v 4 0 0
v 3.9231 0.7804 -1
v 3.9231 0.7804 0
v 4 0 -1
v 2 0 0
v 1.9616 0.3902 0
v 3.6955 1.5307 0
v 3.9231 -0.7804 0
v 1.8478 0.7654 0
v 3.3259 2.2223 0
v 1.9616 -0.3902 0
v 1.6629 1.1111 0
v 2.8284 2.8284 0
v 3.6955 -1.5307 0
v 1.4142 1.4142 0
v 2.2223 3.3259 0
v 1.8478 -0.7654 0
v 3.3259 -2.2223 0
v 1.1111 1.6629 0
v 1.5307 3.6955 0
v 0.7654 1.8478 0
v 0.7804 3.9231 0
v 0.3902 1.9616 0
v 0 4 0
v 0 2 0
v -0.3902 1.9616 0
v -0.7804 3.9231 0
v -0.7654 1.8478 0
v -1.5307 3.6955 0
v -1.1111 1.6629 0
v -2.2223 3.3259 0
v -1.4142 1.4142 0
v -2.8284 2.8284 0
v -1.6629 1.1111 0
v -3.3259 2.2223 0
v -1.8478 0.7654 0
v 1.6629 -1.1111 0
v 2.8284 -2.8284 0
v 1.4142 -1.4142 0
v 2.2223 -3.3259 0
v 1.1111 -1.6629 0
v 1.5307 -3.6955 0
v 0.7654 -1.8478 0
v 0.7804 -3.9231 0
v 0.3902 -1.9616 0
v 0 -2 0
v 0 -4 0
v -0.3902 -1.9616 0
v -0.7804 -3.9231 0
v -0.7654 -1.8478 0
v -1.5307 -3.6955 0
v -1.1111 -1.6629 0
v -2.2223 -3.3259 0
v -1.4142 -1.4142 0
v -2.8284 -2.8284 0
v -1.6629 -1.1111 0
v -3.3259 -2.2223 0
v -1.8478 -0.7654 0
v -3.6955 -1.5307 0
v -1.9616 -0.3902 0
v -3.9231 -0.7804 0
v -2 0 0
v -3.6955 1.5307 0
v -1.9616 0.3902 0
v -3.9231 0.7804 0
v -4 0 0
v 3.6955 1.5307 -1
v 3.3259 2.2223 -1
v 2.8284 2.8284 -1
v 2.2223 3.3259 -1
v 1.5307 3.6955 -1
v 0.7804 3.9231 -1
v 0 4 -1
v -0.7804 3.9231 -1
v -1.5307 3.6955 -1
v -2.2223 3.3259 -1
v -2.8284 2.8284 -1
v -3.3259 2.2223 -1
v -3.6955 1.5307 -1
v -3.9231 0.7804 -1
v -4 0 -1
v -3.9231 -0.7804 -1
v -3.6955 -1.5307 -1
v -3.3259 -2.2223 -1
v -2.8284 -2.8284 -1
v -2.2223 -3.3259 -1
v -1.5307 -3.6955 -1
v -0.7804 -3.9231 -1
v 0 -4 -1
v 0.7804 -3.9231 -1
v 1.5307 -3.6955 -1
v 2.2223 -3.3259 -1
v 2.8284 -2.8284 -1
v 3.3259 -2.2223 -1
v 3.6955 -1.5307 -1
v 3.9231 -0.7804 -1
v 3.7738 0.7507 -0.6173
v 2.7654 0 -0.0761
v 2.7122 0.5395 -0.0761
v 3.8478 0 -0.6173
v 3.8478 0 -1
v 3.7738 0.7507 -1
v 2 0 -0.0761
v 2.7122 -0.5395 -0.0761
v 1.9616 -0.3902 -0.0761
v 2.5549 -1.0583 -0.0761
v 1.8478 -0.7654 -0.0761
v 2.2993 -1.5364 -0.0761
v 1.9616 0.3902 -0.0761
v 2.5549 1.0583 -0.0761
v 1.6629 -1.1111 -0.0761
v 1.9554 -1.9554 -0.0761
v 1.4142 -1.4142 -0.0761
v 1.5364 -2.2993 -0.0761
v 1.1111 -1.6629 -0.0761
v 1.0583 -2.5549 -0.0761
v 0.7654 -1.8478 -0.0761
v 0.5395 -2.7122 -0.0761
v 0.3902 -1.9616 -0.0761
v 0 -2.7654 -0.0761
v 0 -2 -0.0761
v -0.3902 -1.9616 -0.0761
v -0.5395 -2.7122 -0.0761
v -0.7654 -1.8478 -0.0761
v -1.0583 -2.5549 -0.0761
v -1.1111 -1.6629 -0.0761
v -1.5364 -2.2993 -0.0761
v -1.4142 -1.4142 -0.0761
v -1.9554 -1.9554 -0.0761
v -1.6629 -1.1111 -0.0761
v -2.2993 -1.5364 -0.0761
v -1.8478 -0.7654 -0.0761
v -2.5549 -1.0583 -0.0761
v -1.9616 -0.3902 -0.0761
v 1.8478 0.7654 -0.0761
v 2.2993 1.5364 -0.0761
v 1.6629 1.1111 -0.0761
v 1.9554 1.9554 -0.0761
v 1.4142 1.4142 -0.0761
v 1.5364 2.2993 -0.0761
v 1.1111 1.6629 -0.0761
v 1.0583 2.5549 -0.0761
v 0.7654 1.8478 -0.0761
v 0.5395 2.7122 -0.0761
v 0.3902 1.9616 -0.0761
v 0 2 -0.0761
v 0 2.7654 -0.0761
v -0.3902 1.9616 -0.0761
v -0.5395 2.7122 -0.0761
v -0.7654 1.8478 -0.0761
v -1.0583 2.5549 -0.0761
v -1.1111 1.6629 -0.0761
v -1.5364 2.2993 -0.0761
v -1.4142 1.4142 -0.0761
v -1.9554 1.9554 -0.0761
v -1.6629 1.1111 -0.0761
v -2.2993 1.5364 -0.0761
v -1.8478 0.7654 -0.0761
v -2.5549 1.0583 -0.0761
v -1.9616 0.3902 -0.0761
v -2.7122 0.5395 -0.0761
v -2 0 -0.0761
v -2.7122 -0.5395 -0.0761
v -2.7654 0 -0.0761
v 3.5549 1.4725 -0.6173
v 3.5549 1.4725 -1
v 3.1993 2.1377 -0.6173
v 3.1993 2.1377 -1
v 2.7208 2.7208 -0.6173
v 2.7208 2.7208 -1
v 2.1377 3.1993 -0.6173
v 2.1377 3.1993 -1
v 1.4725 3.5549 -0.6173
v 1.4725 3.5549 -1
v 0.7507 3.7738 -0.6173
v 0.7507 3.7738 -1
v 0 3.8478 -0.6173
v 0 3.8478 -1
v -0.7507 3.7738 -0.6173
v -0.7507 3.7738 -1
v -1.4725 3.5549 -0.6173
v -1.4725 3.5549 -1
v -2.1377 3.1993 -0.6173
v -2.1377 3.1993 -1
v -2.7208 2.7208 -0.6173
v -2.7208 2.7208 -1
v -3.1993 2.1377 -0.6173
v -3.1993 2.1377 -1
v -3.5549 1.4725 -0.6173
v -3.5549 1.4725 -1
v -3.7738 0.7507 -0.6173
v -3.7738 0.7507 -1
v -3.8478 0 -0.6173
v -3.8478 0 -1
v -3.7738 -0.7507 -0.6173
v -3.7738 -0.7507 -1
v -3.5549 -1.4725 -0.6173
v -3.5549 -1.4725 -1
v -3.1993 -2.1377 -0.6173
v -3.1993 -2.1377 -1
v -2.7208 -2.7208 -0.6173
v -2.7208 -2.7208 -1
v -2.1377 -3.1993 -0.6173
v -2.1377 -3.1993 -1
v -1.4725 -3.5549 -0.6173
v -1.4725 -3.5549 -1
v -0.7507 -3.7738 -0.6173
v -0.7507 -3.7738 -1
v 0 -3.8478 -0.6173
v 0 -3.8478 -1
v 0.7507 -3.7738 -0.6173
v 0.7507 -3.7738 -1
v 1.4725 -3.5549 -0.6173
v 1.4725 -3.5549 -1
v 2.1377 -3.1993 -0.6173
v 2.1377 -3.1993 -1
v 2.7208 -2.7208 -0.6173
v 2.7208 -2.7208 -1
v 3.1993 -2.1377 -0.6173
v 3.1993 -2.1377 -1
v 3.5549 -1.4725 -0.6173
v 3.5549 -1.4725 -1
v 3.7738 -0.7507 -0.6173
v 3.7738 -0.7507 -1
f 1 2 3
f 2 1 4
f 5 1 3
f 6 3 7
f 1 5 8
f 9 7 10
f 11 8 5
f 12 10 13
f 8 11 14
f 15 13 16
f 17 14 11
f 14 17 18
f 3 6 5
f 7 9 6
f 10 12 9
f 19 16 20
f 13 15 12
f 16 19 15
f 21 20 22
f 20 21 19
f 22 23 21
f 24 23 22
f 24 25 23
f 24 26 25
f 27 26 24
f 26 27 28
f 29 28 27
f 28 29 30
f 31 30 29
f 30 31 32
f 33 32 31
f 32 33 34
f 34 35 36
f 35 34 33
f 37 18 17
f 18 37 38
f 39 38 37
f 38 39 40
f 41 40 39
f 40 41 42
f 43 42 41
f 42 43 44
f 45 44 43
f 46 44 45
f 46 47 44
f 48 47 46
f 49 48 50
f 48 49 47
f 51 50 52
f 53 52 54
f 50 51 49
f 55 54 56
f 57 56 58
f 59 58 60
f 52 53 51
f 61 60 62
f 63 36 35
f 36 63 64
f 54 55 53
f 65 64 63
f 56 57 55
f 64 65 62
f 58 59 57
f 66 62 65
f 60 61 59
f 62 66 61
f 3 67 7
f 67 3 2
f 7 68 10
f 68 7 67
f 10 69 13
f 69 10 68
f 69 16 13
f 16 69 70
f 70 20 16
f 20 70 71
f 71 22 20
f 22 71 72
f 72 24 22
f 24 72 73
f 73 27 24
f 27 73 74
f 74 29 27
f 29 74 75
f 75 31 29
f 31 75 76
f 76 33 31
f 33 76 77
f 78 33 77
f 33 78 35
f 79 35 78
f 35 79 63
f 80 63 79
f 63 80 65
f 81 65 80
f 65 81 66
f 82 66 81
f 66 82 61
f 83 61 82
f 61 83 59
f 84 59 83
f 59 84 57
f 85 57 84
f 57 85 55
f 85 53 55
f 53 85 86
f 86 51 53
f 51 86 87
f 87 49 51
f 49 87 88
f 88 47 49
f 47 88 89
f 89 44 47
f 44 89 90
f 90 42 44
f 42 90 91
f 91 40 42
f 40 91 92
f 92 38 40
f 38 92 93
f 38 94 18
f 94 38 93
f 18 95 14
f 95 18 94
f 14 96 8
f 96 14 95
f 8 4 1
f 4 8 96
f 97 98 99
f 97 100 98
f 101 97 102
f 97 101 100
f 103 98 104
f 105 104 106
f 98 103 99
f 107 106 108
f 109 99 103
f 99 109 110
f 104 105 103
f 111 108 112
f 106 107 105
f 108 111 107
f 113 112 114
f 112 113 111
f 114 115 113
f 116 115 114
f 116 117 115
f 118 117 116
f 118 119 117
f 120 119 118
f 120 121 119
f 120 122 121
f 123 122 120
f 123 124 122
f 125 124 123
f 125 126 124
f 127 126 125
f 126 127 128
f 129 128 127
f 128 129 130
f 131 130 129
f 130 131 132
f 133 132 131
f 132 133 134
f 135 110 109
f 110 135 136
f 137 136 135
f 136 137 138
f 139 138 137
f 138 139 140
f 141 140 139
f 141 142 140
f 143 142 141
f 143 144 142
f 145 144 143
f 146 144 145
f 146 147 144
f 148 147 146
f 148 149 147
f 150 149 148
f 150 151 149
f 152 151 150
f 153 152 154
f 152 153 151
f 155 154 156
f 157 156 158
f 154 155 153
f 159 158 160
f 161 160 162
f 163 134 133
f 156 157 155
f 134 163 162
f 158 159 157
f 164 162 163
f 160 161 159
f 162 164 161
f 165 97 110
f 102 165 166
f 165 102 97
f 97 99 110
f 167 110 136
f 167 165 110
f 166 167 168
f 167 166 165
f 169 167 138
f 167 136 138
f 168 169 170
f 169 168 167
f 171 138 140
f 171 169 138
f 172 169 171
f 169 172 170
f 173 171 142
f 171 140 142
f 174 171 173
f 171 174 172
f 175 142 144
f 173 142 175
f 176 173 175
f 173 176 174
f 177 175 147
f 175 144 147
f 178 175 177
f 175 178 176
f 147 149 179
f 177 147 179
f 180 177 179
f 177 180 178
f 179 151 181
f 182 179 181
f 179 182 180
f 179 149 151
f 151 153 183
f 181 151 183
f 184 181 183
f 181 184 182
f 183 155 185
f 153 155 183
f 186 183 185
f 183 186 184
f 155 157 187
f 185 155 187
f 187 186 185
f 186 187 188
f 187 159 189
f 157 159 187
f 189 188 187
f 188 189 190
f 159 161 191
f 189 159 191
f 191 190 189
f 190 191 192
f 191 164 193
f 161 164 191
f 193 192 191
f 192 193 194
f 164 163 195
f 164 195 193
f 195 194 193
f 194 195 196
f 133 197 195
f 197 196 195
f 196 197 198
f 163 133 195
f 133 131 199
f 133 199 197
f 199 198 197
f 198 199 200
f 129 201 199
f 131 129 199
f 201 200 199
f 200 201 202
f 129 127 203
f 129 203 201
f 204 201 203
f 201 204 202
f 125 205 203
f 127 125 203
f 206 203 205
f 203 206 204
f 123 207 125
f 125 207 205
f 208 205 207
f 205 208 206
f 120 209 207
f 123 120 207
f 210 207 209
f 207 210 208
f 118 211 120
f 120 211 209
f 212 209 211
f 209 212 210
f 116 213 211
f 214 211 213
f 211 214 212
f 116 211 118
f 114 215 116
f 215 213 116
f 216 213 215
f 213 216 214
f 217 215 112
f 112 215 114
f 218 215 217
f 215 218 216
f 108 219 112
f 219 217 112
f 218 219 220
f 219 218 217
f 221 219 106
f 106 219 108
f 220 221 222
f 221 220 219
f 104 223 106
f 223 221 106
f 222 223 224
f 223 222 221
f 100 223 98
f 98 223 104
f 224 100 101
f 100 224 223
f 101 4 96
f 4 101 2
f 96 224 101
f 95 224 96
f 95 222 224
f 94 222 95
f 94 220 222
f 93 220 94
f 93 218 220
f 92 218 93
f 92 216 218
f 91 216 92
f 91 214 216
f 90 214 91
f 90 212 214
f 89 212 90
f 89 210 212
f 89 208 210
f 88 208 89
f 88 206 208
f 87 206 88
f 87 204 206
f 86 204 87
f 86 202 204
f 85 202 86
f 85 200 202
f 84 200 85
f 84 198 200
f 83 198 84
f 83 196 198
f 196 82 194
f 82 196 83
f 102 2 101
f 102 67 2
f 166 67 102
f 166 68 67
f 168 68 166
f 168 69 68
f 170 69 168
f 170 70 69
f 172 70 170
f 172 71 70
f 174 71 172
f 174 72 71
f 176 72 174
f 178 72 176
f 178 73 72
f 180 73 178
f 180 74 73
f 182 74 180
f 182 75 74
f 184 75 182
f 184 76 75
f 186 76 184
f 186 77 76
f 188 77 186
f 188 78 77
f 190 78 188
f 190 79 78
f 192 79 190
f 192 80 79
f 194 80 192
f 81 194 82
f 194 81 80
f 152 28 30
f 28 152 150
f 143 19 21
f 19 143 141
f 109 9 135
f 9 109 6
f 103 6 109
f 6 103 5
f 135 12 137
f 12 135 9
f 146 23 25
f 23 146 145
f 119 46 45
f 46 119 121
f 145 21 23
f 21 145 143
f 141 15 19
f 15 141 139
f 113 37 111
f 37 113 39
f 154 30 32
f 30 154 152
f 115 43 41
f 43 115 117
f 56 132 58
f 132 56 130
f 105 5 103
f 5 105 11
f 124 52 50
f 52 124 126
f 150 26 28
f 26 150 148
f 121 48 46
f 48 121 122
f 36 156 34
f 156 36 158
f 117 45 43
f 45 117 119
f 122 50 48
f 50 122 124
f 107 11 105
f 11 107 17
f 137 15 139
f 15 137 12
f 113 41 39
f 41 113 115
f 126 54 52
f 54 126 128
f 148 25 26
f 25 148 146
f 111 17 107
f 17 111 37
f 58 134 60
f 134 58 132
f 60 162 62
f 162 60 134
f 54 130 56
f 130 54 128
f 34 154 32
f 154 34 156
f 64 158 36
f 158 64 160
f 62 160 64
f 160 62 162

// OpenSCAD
// Fillets

module offsetSphere(rad, amount) {
    translate([amount,0,0])
    sphere(r=rad);
}

module offsetCube(size, amount) {
    translate([amount,0,0])
    rotate([0,0,45])
    cube([size/sqrt(2), size/sqrt(2), size], center=true);
}

module torify(step=16, scl=1.0) {
    scale([1.0, 1.0, scl])
    for (i=[0:step-1]) {
        hull() {
            rotate([0,0,i*360/step])
            children();
            rotate([0,0,(i+1)*360/step])
            children();
        }
    }

}

module condZTranslate(amount, cond) {
    if (cond) {
        translate([0,0,amount])
        children();
    } else {
        translate([0,0,-amount])
        children();
    }
}

module circularInwardFillet3D(circle_r, fillet_r, up=false, step=16, scl=1.0) {
    condZTranslate(-fillet_r*scl, up)
    intersection() {
        difference() {
            torify(step=step, scl=scl)
            offsetCube(size=fillet_r*2, amount=circle_r+fillet_r);
            torify(step=step, scl=scl)
            offsetSphere(rad=fillet_r, amount=circle_r+fillet_r);
        }
        if (up) {
            translate([0,0,0])
            cylinder(r=circle_r+fillet_r, h=fillet_r*scl, $fn=step);
        } else {
            translate([0,0,-fillet_r*scl])
            cylinder(r=circle_r+fillet_r, h=fillet_r*scl, $fn=step);
        }
    }
}

module circularOutwardFillet3D(circle_r, fillet_r, up=false, step=16, scl=1.0) {
    // For outward: keep true inner diameter = 2*circle_r
    // Build a torus with minor r=fillet_r centered at radius circle_r,
    // then keep only the outer half-ring [circle_r, circle_r+fillet_r].
    condZTranslate(-fillet_r*scl, up)
    intersection() {
        // Torus tube (built via your torify+hull trick) centered at circle_r
        difference() {
            torify(step=step, scl=scl)
                offsetCube(size=fillet_r*2, amount=circle_r);     // CHANGED: was circle_r+fillet_r
            torify(step=step, scl=scl)
                offsetSphere(rad=fillet_r, amount=circle_r);      // CHANGED: was circle_r+fillet_r
        }

        // Radial mask: keep outer half of the tube [circle_r, circle_r+fillet_r]
        if (up) {
            translate([0,0,0])
            difference() {
                cylinder(r=circle_r+fillet_r, h=fillet_r*scl, $fn=step); // outer bound
                cylinder(r=circle_r,          h=fillet_r*scl, $fn=step); // inner bound
            }
        } else {
            translate([0,0,-fillet_r*scl])
            difference() {
                cylinder(r=circle_r+fillet_r, h=fillet_r*scl, $fn=step);
                cylinder(r=circle_r,          h=fillet_r*scl, $fn=step);
            }
        }
    }
}


circularOutwardFillet3D(2, 2, up=true, step=32, scl=0.5);
